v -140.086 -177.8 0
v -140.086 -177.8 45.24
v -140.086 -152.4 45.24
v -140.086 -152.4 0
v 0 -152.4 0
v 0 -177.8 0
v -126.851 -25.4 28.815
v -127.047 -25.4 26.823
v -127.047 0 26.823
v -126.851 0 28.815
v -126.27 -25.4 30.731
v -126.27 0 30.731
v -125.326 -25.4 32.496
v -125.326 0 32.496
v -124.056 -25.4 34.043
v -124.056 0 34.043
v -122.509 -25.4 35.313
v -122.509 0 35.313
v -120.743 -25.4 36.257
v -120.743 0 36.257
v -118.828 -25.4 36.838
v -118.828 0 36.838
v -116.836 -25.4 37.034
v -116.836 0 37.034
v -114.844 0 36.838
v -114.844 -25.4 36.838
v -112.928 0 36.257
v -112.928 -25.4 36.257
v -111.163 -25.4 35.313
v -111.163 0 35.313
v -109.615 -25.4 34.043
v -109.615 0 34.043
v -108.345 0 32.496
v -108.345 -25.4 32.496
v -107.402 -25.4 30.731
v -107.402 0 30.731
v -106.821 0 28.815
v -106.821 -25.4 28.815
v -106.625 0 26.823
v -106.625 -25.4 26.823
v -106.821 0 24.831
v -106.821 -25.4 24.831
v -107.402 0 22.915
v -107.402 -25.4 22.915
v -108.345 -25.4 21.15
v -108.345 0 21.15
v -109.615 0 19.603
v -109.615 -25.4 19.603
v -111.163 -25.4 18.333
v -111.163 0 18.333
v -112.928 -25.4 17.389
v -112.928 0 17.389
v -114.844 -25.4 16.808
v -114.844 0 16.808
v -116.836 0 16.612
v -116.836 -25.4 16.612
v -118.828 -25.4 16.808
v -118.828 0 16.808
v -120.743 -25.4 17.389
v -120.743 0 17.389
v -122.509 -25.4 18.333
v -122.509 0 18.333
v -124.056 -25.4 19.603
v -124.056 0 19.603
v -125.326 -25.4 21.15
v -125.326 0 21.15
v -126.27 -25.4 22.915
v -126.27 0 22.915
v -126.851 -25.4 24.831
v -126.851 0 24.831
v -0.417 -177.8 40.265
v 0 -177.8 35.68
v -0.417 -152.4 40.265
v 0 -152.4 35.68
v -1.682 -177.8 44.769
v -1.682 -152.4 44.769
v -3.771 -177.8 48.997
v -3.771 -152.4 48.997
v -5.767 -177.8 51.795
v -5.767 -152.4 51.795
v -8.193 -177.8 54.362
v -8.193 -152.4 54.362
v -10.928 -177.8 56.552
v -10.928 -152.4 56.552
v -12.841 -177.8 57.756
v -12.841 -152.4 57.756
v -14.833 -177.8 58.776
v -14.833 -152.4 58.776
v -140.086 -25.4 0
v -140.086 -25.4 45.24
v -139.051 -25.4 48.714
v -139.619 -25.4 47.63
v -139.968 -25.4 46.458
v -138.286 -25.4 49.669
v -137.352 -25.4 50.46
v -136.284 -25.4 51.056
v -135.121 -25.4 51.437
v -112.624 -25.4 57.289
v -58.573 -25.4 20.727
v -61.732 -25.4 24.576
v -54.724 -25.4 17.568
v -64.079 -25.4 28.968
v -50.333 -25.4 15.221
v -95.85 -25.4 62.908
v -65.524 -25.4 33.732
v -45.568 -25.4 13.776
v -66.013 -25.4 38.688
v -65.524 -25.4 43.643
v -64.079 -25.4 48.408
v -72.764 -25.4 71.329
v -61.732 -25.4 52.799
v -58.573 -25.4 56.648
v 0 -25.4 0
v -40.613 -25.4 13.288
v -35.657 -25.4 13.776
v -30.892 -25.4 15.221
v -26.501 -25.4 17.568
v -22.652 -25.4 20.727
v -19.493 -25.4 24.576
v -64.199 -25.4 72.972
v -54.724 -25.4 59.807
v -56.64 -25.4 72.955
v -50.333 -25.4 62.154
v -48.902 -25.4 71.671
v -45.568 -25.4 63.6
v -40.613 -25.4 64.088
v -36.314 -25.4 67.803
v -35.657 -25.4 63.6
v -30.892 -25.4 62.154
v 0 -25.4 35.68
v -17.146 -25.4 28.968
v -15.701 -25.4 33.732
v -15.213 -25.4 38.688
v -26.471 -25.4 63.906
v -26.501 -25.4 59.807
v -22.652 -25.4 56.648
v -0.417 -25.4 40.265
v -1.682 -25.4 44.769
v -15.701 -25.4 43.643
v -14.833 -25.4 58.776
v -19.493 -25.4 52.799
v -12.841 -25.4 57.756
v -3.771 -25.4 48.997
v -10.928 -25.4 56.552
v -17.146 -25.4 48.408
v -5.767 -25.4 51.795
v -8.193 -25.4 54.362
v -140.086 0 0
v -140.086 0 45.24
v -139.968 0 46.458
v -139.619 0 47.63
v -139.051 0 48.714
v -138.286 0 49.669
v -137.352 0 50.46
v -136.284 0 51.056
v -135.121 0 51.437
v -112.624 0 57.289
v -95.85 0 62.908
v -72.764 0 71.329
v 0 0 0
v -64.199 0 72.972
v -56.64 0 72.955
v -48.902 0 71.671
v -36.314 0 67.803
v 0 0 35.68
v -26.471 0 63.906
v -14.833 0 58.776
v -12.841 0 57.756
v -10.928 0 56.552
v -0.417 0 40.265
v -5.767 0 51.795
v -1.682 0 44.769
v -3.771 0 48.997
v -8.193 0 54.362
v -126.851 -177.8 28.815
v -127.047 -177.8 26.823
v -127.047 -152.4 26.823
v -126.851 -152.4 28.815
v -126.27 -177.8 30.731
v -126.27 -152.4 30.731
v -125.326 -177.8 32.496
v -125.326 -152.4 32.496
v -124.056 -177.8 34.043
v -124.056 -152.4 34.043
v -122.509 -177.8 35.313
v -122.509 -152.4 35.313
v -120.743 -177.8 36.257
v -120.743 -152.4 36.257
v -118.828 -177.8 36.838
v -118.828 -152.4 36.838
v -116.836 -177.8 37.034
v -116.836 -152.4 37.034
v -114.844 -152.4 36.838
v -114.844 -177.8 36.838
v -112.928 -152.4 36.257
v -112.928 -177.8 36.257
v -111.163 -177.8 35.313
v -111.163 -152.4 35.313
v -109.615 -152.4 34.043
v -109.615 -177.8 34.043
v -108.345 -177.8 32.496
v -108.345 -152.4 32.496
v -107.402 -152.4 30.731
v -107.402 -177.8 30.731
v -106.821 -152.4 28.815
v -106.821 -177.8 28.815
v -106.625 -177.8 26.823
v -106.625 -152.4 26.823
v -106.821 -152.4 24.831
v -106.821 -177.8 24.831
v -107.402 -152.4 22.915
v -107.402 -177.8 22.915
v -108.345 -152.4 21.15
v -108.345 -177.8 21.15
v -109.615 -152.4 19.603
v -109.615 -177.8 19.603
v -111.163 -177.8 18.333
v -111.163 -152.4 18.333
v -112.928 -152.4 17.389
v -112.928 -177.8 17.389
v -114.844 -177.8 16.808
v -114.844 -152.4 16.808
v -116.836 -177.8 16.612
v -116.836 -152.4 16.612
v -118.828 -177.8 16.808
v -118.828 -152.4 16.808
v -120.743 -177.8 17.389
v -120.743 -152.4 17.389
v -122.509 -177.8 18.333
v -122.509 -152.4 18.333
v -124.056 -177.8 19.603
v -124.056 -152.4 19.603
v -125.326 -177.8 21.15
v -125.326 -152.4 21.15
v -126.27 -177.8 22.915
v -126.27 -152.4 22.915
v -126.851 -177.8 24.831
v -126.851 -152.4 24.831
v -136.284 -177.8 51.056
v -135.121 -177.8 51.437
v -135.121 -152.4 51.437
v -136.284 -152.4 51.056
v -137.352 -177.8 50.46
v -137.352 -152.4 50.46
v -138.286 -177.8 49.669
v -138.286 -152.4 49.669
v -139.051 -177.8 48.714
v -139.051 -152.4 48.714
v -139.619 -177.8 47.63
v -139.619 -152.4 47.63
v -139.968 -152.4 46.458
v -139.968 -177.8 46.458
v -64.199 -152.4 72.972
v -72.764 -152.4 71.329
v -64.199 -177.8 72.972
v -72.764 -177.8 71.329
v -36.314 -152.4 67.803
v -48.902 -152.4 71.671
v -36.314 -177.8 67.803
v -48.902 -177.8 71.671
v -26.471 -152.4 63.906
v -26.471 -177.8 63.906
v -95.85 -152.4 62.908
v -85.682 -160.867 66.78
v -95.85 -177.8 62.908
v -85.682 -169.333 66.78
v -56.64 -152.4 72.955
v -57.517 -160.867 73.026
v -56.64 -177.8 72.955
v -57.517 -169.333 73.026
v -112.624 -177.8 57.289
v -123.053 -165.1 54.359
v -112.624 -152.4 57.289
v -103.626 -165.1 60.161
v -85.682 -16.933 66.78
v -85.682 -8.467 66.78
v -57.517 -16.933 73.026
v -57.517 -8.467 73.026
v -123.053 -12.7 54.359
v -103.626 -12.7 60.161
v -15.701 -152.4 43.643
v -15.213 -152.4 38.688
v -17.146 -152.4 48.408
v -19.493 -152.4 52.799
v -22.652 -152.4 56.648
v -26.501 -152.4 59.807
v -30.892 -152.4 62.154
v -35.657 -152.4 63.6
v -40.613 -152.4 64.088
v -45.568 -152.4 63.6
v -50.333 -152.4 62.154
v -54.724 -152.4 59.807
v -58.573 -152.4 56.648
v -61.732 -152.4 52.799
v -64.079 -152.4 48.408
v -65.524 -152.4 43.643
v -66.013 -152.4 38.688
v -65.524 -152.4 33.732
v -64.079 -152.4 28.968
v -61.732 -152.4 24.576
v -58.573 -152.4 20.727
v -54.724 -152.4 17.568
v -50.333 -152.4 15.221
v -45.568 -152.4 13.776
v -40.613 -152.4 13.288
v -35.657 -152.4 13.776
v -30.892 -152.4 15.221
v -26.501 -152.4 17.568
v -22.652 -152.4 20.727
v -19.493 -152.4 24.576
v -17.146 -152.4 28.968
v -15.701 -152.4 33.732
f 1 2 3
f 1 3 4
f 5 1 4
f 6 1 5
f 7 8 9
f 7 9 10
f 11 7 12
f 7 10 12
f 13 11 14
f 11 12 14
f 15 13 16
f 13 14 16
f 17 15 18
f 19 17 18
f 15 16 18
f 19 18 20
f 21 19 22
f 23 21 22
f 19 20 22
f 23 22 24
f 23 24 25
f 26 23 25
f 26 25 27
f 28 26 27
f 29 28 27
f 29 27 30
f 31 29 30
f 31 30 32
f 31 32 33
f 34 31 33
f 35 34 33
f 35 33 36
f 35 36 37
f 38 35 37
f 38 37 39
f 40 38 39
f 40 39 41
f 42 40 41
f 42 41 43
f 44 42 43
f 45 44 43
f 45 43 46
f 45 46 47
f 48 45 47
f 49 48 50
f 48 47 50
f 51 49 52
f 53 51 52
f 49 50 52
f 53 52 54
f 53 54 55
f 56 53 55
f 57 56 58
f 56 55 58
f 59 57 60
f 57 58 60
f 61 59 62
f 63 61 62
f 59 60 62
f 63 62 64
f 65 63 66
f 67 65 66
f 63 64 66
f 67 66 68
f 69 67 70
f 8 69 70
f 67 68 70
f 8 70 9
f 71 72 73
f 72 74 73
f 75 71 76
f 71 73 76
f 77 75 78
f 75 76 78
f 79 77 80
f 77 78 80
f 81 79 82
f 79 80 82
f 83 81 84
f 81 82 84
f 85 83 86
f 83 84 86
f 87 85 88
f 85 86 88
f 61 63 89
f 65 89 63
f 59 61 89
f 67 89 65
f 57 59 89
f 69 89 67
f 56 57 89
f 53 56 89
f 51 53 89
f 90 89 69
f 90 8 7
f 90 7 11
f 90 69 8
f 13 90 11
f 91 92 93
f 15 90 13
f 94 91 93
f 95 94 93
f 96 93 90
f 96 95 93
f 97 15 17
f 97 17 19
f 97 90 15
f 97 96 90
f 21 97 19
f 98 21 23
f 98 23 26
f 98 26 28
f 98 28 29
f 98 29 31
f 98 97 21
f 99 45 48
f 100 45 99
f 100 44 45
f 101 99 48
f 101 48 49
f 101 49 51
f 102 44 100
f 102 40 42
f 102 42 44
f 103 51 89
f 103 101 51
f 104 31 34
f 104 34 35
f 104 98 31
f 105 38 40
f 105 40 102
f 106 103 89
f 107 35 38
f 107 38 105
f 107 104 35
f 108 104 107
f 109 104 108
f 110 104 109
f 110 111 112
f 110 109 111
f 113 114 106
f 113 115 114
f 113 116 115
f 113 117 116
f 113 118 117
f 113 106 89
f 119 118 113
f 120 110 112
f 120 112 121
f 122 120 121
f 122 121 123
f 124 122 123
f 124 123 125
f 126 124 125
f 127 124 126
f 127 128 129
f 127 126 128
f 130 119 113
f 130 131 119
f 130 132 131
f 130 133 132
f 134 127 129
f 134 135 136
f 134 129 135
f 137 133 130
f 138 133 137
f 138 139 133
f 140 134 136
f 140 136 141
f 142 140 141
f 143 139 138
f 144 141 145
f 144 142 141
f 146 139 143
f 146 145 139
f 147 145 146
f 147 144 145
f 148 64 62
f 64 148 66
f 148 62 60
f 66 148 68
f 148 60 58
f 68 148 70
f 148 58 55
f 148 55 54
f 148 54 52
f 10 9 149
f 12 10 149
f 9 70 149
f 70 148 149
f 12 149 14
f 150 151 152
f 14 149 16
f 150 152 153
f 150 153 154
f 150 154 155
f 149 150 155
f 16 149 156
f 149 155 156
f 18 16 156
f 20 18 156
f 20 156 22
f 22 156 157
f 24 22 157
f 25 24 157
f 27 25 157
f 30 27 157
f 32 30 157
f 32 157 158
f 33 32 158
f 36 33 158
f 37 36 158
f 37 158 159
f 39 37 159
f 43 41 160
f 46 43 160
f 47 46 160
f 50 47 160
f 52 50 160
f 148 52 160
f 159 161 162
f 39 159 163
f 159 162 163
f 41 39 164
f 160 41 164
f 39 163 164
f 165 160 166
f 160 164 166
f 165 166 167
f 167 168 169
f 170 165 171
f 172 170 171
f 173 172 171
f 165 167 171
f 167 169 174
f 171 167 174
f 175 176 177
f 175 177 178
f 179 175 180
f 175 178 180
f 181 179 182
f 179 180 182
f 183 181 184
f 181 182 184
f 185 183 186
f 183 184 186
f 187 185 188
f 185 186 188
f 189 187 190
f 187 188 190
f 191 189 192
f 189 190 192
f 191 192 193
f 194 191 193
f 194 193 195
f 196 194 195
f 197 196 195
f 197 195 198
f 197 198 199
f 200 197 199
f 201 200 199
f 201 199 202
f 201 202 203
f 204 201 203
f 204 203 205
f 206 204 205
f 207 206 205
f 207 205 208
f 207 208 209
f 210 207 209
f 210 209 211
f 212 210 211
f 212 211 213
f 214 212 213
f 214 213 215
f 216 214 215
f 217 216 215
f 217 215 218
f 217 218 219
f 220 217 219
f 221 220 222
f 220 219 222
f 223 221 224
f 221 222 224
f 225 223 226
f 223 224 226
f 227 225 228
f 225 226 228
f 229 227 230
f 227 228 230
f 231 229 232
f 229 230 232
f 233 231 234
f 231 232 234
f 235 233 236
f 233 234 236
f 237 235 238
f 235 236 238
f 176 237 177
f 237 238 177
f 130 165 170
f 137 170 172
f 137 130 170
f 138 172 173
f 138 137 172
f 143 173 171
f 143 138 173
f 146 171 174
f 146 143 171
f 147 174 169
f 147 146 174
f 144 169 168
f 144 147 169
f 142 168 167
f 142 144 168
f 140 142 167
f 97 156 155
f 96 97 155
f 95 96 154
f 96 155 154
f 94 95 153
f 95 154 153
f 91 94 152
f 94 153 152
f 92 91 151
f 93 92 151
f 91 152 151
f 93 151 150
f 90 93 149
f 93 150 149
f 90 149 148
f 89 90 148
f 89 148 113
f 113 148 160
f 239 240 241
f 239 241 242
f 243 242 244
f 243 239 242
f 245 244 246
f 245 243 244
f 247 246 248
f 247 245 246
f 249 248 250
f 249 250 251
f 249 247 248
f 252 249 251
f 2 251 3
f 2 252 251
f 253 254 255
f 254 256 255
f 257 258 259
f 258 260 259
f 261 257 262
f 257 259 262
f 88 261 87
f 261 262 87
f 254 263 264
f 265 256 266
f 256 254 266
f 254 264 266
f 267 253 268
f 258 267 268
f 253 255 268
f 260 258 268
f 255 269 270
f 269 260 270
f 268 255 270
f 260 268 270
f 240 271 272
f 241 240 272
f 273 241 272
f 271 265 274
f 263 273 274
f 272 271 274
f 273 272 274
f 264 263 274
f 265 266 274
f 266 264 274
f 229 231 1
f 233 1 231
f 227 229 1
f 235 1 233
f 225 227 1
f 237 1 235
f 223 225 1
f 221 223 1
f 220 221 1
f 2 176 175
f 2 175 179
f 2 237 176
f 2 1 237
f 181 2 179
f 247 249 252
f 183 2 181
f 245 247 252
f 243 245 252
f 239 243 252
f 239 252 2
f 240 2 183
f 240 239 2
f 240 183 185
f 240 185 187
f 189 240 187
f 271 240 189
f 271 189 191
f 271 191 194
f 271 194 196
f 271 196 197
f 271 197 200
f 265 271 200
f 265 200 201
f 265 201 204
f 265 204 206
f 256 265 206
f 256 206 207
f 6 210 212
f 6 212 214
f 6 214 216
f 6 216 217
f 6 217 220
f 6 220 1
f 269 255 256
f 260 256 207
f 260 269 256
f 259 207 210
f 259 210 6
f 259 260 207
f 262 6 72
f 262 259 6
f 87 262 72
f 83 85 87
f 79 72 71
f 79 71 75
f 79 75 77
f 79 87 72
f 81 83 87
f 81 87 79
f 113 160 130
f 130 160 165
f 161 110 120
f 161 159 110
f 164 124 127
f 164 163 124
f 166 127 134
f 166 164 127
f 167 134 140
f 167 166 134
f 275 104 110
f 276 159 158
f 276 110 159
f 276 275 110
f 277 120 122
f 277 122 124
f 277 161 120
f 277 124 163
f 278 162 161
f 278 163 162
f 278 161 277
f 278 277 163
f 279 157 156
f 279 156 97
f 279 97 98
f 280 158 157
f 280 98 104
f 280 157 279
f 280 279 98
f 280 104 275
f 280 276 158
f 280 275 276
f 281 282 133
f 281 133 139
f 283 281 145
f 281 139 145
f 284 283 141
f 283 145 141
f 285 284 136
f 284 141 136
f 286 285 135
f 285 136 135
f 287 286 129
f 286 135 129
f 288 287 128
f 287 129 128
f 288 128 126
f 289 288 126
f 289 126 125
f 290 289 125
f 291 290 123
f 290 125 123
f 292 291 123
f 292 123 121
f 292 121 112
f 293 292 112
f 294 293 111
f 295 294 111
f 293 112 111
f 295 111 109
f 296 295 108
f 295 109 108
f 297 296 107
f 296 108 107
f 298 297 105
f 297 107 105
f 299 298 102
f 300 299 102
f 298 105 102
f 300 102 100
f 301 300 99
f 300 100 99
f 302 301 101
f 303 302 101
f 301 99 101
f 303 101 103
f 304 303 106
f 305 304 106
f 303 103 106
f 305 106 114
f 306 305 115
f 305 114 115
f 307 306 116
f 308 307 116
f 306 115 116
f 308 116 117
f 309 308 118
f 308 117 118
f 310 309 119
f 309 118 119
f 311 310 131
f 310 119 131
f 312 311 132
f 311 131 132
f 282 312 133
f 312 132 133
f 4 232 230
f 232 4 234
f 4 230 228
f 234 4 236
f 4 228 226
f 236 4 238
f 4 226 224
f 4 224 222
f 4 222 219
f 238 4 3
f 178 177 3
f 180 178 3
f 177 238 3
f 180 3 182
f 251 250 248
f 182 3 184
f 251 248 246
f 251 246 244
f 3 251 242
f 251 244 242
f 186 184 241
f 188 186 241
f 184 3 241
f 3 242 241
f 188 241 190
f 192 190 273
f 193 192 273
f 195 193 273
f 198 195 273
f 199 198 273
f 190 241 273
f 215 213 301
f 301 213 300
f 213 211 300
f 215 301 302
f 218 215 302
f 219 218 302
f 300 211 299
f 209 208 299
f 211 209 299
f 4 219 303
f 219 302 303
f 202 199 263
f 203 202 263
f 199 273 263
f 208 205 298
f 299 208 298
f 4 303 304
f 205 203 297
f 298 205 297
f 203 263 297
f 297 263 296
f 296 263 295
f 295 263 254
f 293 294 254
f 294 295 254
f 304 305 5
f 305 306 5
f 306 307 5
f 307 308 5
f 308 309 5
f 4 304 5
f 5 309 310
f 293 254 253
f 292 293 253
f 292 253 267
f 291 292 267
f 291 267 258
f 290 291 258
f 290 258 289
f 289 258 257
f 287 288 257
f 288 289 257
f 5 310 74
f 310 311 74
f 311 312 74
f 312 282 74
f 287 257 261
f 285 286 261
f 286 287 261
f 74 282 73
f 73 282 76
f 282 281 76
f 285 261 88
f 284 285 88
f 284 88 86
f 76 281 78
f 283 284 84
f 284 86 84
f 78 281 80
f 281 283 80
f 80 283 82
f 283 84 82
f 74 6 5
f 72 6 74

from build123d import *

# Parameters (mm, degrees)
F1_DEPTH = 25.4
F2_R     = 25.4
F3_DEPTH = 127
F6_R     = 25.3967781552
F7_R     = 10.211273354
F8_DEPTH = 211.42987


# Not quite as in the source:
# - a feature of the source that left no trace in its solid (it failed there, or was rolled back) is left out
# - a pattern or mirror of a feature is missing from the dataset's text; its kind, count and spacing are read off the source's solid


with BuildPart() as f1:
    # F0 (on Front) → F1 (new body)
    with BuildSketch(Plane.XZ):
        with BuildLine():
            Line((-140.086213054, 0), (0, 0))
            Line((0, 0), (0, 51.7864115536))
            add(Edge.make_bspline(
                [(-135.121182604, 51.4369904306), (-57.8541277154, 68.705081156), (-79.1493766813, 89.948796737), (0, 51.7864115536)],
                knots=[0.0132853618, 0.0132853618, 0.0132853618, 0.0132853618, 0.6502691411, 0.6502691411, 0.6502691411, 0.6502691411], degree=3))
            ThreePointArc((-135.121182604, 51.4369904306), (-138.6918692488, 49.210252186), (-140.086213054, 45.2398653435))
            Line((-140.086213054, 45.2398653435), (-140.086213054, 0))
        make_face()
    extrude(amount=F1_DEPTH)


with BuildPart() as f1_copies_1:
    # F1_copies: instance of F1
    add(f1.part.mirror(Plane(origin=(0, -88.9, 1e-06), x_dir=(0, 0, -1), z_dir=(0, -1, 0))))


with BuildPart() as f1_1:
    add(f1.part)

    add(f1_copies_1.part)  # F3 merges F1_copies_1
    # F2 (on face) → F3 (join)
    with BuildSketch(Plane.XZ.offset(25.4)):
        with Locations((-40.6125485897, 38.6877208911)):
            Circle(F2_R)
    extrude(amount=F3_DEPTH)

    # F6
    f6_edges = [f1_1.edges().sort_by_distance(p)[0] for p in [
        (0, -12.7, 51.786412),
        (0, -165.1, 51.786412),
    ]]
    fillet(f6_edges, radius=F6_R)

    # F7 (on face) → F8 (cut)
    with BuildSketch(Plane(origin=(0, 0, 0), x_dir=(-1, 0, 0), z_dir=(0, 1, 0))):
        with Locations((116.8357878923, 26.8229749054)):
            Circle(F7_R)
    extrude(amount=-F8_DEPTH, mode=Mode.SUBTRACT)


solid = f1_1.part
